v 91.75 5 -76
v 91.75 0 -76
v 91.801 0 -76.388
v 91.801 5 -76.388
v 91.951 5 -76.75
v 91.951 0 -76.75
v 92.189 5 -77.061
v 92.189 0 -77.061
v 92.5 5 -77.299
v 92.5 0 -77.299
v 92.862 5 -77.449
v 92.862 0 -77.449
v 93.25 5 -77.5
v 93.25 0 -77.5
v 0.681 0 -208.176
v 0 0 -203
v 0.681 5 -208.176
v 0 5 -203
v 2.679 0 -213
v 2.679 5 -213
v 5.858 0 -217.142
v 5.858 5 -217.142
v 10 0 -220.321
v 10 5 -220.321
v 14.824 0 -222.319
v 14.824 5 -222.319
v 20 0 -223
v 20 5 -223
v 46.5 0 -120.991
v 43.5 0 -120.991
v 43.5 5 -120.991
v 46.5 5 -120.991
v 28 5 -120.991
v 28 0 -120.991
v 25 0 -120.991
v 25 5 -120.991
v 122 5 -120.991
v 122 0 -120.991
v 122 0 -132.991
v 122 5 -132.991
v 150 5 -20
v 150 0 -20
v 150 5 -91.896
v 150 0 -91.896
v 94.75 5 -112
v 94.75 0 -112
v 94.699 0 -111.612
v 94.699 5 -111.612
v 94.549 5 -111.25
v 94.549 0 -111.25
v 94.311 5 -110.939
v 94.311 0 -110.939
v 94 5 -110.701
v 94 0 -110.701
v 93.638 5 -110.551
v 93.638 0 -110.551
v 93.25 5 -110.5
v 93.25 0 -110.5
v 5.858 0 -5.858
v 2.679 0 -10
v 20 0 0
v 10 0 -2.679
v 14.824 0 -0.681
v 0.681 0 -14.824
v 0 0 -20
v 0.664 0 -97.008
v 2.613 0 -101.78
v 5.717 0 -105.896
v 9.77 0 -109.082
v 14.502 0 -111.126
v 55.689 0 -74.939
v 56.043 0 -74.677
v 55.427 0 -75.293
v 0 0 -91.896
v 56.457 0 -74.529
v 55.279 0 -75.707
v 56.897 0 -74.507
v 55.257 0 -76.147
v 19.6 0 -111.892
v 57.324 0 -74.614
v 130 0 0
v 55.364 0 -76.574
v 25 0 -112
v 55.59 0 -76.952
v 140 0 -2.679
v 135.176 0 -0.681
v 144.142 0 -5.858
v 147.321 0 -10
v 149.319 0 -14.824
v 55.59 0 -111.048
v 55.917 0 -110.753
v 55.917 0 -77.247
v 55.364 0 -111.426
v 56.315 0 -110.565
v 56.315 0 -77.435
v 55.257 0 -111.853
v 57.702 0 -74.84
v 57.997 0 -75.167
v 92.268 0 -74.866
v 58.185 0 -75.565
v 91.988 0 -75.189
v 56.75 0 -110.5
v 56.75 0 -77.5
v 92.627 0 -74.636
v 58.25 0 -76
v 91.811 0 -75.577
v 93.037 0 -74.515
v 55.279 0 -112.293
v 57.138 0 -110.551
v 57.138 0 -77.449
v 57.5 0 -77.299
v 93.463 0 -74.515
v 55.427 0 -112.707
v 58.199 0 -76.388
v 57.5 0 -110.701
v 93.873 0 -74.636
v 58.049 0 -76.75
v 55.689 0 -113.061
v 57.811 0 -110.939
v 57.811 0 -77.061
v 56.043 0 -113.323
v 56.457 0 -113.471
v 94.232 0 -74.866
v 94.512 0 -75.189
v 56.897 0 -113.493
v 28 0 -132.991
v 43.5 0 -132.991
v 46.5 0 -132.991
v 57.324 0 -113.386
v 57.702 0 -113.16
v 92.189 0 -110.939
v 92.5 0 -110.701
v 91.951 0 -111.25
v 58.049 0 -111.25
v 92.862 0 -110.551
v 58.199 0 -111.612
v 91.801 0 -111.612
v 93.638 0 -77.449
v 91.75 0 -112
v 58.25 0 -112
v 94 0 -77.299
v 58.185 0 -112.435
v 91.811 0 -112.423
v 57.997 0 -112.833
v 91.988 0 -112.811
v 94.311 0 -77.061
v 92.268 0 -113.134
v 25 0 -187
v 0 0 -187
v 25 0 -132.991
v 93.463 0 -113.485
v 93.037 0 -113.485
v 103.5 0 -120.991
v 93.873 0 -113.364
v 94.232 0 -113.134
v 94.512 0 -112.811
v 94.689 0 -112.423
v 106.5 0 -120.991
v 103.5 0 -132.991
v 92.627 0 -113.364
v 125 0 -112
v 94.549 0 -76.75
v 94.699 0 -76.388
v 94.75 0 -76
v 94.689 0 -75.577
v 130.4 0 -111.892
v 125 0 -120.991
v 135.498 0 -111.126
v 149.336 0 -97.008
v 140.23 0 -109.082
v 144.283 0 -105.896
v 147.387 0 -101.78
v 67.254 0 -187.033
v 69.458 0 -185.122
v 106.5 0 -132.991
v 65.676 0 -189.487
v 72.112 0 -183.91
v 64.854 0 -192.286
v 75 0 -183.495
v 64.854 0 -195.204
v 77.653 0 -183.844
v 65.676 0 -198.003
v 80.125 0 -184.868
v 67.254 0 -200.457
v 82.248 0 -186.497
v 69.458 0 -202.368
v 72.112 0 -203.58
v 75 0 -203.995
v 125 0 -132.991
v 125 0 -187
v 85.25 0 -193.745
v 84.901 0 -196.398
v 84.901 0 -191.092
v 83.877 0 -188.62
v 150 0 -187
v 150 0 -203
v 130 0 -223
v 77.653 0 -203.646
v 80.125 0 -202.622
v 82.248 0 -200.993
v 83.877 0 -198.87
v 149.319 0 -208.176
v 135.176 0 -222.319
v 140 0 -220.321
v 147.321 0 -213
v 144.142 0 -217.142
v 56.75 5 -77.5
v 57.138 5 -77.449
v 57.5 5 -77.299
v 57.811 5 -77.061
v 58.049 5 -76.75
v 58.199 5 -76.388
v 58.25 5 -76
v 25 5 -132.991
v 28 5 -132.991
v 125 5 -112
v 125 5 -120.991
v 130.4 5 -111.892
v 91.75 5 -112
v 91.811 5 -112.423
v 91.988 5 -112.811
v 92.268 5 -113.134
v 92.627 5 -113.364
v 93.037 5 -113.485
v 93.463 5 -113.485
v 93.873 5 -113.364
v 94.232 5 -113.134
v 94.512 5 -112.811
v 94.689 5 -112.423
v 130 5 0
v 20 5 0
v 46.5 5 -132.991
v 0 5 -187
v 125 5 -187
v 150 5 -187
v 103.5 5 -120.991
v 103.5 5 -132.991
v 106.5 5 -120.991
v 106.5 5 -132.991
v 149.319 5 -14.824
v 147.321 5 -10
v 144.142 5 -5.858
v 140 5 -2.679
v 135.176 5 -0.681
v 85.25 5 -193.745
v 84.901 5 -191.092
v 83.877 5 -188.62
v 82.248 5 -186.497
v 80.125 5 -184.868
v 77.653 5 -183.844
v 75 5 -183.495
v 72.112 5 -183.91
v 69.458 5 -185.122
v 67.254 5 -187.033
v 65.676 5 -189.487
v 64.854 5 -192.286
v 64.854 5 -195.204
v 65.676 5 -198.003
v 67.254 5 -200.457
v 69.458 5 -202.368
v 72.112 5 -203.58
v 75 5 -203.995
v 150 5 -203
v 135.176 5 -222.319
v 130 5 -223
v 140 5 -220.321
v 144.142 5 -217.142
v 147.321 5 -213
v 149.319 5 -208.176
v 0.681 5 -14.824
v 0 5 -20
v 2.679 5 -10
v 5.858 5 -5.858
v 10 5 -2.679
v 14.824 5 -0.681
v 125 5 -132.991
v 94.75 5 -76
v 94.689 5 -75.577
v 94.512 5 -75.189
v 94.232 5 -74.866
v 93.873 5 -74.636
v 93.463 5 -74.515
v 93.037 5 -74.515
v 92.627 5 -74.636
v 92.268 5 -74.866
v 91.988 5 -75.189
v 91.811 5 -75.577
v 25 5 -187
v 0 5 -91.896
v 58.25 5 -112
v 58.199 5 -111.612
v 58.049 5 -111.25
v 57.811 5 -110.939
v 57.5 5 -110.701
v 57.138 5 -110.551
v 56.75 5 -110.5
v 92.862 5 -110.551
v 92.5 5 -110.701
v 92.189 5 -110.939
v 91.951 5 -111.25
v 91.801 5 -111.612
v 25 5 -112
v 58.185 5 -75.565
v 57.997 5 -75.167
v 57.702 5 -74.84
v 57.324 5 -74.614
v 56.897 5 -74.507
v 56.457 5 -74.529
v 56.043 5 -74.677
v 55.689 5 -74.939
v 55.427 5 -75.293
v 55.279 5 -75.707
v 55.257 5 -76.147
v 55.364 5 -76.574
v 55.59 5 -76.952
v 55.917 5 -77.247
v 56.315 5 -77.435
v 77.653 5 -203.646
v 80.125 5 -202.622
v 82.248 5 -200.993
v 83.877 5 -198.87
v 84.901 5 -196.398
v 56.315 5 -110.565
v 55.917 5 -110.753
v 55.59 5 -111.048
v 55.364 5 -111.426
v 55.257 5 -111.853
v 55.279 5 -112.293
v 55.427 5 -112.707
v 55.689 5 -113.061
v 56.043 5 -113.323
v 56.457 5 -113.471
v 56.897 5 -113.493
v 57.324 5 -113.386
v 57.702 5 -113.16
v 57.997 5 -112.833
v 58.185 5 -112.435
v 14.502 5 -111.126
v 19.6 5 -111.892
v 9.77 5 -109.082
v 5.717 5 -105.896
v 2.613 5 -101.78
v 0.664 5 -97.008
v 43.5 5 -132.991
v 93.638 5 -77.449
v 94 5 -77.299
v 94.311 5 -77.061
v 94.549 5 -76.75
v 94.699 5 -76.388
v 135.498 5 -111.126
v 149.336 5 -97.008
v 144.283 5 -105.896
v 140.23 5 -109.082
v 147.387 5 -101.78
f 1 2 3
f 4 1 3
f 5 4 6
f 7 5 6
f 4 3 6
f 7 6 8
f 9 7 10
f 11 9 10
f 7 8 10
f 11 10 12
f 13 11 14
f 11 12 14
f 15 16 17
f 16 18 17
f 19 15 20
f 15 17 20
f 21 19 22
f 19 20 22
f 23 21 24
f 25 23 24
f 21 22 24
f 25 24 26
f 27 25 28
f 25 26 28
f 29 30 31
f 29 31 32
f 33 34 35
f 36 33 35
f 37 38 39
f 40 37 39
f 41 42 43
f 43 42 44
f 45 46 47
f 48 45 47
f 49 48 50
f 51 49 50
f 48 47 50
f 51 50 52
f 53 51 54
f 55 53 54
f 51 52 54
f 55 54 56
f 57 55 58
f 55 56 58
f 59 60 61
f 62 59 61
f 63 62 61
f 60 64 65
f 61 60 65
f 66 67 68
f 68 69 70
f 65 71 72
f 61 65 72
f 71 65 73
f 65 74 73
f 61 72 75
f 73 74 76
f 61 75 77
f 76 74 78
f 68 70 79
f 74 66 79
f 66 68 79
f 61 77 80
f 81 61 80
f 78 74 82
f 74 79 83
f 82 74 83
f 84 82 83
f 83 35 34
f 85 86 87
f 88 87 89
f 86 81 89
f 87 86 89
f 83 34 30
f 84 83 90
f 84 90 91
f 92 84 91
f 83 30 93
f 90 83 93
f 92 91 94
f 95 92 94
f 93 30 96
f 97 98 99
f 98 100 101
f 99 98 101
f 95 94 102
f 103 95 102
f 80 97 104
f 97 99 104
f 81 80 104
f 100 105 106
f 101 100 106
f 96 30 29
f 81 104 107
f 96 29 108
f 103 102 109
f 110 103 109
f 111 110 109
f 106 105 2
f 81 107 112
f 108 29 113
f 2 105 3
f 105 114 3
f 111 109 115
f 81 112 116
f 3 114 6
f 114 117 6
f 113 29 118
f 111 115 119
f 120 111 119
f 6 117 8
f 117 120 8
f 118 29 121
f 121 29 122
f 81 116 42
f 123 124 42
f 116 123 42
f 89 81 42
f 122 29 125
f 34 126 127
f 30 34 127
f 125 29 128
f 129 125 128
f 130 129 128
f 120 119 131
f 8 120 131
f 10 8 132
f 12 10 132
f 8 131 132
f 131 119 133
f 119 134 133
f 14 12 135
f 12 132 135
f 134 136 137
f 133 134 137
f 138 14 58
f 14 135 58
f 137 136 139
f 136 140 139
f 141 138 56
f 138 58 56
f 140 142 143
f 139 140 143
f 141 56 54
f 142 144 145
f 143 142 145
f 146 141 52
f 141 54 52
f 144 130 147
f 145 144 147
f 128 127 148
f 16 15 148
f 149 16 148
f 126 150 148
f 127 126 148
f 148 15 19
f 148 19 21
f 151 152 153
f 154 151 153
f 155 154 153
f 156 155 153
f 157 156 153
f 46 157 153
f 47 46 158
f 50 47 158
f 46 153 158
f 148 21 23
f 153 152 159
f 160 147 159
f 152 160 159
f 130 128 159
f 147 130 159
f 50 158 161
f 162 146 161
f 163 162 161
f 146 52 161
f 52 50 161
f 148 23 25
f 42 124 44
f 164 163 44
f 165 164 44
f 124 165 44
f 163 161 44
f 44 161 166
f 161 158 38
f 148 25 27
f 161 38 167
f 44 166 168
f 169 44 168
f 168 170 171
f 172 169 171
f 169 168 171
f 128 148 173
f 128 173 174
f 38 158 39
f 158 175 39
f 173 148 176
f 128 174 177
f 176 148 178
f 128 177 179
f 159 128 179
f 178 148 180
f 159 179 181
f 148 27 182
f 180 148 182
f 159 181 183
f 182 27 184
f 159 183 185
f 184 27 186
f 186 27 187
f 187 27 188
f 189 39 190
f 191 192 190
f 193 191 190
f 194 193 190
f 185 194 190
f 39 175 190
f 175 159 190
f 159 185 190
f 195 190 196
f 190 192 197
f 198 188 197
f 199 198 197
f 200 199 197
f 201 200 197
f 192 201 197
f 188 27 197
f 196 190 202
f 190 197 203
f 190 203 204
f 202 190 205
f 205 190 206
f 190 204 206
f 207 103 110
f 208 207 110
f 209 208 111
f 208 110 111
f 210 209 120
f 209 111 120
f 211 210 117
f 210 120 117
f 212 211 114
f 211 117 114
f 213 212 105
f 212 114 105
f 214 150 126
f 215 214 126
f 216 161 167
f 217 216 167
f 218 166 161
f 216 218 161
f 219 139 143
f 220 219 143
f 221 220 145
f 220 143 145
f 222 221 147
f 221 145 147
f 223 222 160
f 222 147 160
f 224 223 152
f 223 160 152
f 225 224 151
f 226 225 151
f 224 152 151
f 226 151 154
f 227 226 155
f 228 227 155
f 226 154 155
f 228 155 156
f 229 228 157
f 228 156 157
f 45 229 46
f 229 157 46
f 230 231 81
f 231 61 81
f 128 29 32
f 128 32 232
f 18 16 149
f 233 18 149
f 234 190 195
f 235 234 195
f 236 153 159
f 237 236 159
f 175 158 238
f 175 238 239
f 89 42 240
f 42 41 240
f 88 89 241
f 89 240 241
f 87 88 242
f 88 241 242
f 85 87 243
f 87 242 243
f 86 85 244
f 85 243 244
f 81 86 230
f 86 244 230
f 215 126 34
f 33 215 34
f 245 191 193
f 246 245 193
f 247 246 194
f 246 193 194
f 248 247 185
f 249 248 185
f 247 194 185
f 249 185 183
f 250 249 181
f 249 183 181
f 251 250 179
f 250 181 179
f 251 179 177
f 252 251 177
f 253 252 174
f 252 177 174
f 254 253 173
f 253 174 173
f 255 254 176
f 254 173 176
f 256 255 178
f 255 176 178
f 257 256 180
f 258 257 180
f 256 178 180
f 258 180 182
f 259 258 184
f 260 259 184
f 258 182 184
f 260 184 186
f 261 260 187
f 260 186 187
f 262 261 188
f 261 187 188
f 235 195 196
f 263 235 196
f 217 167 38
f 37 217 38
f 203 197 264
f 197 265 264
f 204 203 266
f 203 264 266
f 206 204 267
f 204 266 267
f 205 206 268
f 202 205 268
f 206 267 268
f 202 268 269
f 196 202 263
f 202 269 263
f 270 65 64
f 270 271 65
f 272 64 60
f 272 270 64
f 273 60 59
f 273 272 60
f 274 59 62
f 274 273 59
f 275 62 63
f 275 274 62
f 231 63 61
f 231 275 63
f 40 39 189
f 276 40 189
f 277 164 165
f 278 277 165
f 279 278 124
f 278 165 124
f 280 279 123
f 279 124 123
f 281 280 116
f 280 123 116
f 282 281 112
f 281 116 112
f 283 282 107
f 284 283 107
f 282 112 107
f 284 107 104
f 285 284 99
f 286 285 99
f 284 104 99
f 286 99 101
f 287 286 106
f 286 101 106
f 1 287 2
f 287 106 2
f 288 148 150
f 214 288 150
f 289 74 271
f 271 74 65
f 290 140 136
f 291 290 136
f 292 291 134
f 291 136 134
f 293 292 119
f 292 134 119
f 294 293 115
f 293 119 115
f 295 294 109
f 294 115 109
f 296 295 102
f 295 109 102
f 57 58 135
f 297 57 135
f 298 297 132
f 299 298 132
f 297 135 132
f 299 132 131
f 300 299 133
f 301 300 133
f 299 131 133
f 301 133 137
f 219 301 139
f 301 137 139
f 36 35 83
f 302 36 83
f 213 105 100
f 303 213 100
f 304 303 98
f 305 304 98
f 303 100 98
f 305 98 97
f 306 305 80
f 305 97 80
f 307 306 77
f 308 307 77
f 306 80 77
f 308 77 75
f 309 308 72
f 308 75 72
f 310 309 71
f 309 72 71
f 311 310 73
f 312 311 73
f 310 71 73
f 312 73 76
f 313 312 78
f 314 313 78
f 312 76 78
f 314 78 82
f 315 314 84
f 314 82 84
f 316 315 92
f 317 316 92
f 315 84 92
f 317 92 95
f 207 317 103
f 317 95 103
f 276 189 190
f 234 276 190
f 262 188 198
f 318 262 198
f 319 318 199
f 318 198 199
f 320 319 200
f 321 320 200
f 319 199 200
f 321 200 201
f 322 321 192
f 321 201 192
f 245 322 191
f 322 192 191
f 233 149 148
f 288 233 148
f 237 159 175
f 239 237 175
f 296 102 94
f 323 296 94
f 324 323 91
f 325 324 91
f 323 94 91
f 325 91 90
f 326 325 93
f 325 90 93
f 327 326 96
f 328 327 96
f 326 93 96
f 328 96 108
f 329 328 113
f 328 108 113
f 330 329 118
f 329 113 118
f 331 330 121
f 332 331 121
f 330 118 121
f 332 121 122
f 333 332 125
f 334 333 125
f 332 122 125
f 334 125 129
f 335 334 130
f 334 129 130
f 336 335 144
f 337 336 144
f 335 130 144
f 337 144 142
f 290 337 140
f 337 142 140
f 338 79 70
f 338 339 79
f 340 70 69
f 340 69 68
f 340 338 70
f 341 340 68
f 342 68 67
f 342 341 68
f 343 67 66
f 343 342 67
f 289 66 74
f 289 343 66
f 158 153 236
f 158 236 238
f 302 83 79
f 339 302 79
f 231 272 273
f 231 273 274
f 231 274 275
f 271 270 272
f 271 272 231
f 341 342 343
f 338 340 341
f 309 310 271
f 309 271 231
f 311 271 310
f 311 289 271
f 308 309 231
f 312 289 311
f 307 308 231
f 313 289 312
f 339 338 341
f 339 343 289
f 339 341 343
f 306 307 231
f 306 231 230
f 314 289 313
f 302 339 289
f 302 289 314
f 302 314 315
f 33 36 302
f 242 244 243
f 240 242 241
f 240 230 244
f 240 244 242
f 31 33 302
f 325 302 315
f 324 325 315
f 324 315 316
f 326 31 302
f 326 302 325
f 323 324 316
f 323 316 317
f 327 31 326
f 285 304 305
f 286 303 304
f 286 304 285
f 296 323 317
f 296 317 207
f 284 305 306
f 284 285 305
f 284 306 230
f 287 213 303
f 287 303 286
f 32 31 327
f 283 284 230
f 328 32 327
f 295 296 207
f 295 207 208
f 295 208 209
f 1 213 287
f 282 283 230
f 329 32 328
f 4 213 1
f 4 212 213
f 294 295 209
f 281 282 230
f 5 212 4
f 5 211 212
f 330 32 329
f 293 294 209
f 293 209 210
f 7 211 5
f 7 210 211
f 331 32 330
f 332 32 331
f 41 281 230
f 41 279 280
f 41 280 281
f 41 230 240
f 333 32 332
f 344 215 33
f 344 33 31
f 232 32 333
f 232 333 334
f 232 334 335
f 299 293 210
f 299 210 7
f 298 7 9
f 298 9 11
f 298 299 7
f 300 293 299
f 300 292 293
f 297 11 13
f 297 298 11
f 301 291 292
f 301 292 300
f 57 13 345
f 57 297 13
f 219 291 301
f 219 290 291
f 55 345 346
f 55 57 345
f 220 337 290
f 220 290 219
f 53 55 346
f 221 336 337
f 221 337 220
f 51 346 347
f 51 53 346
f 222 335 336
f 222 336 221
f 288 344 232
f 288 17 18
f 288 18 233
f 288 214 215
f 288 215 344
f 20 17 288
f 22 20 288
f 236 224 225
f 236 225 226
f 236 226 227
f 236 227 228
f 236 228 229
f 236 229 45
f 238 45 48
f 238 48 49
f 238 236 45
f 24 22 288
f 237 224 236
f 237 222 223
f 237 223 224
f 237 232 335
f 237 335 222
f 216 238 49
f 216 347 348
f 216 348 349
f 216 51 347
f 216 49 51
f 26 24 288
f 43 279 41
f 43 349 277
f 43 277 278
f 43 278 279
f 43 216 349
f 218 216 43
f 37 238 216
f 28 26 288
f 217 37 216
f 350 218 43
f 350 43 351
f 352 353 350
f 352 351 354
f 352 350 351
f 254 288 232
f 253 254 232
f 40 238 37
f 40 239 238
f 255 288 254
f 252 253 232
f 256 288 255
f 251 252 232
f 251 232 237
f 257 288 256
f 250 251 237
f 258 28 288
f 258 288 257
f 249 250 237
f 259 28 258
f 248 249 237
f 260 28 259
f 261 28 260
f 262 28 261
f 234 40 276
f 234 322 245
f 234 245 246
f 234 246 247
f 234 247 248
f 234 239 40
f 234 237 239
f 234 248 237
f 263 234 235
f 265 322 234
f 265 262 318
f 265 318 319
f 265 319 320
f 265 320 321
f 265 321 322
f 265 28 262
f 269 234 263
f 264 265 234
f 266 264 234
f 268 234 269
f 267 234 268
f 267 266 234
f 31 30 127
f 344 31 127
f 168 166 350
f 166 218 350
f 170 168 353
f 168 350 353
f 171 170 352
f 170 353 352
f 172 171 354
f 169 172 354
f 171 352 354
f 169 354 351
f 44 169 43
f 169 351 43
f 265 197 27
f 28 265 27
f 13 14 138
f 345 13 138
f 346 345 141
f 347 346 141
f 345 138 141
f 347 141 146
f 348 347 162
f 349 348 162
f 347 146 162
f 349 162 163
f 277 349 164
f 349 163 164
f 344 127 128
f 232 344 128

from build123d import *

# Parameters (mm, degrees)
SKETCH1_W           = 3
SKETCH1_H           = 12
BOSS_EXTRUDE1_DEPTH = 5
FILLET3_R           = 20
FILLET4_R           = 20
FILLET5_R           = 20


with BuildPart() as part:
    # Sketch1 → Boss-Extrude1 (new body)
    # profile 1 of 4: a face of its own
    with BuildSketch(Plane(origin=(0, 0, 0), x_dir=(1, 0, 0), z_dir=(0, 1, 0))):
        with BuildLine():
            Line((0, 0), (75, 0))
            Line((75, 0), (75, 76))
            Line((75, 76), (58.25, 76))
            ThreePointArc((58.25, 76), (55.689339828, 74.939339828), (56.75, 77.5))
            Line((56.75, 77.5), (56.75, 110.5))
            ThreePointArc((56.75, 110.5), (55.689339828, 113.060660172), (58.25, 112))
            Line((58.25, 112), (75, 112))
            Line((75, 112), (75, 183.494931242))
            ThreePointArc((75, 183.494931242), (64.75, 193.744931242), (75, 203.994931242))
            Line((75, 203.994931242), (75, 223))
            Line((75, 223), (25, 223))
            Line((25, 223), (0, 223))
            Line((0, 223), (0, 187))
            Line((0, 187), (25, 187))
            Line((25, 187), (25, 132.991356344))
            Line((25, 132.991356344), (28, 132.991356344))
            Line((28, 132.991356344), (28, 120.991356344))
            Line((28, 120.991356344), (25, 120.991356344))
            Line((25, 120.991356344), (25, 112))
            Line((25, 112), (0, 111.5))
            Line((0, 111.5), (0, 0))
        make_face()
        with Locations((45, 126.991356344)):
            Rectangle(SKETCH1_W, SKETCH1_H, mode=Mode.SUBTRACT)
    # profile 2 of 4: a face of its own
    with BuildSketch(Plane(origin=(0, 0, 0), x_dir=(1, 0, 0), z_dir=(0, 1, 0))):
        with BuildLine():
            Line((75, 76), (75, 0))
            Line((75, 0), (150, 0))
            Line((150, 0), (150, 111.5))
            Line((150, 111.5), (125, 112))
            Line((125, 112), (125, 120.991356344))
            Line((125, 120.991356344), (122, 120.991356344))
            Line((122, 120.991356344), (122, 132.991356344))
            Line((122, 132.991356344), (125, 132.991356344))
            Line((125, 132.991356344), (125, 187))
            Line((125, 187), (150, 187))
            Line((150, 187), (150, 223))
            Line((150, 223), (75, 223))
            Line((75, 223), (75, 203.994931242))
            ThreePointArc((75, 203.994931242), (82.247844507, 200.992775749), (85.25, 193.744931242))
            ThreePointArc((85.25, 193.744931242), (82.247844507, 186.497086735), (75, 183.494931242))
            Line((75, 183.494931242), (75, 112))
            Line((75, 112), (91.75, 112))
            ThreePointArc((91.75, 112), (93.25, 113.5), (94.75, 112))
            ThreePointArc((94.75, 112), (94.310660172, 110.939339828), (93.25, 110.5))
            Line((93.25, 110.5), (93.25, 77.5))
            ThreePointArc((93.25, 77.5), (94.310660172, 77.060660172), (94.75, 76))
            ThreePointArc((94.75, 76), (93.25, 74.5), (91.75, 76))
            Line((91.75, 76), (75, 76))
        make_face()
        with Locations((105, 126.991356344)):
            Rectangle(SKETCH1_W, SKETCH1_H, mode=Mode.SUBTRACT)
    # profile 3 of 4: a face of its own
    with BuildSketch(Plane(origin=(0, 0, 0), x_dir=(1, 0, 0), z_dir=(0, 1, 0))):
        with BuildLine():
            Line((75, 112), (75, 76))
            Line((75, 76), (91.75, 76))
            ThreePointArc((91.75, 76), (92.189339828, 77.060660172), (93.25, 77.5))
            Line((93.25, 77.5), (93.25, 110.5))
            ThreePointArc((93.25, 110.5), (92.189339828, 110.939339828), (91.75, 112))
            Line((91.75, 112), (75, 112))
        make_face()
    # profile 4 of 4: a face of its own
    with BuildSketch(Plane(origin=(0, 0, 0), x_dir=(1, 0, 0), z_dir=(0, 1, 0))):
        with BuildLine():
            Line((58.25, 76), (75, 76))
            Line((75, 76), (75, 112))
            Line((75, 112), (58.25, 112))
            ThreePointArc((58.25, 112), (57.810660172, 110.939339828), (56.75, 110.5))
            Line((56.75, 110.5), (56.75, 77.5))
            ThreePointArc((56.75, 77.5), (57.810660172, 77.060660172), (58.25, 76))
        make_face()
    extrude(amount=BOSS_EXTRUDE1_DEPTH)

    # Fillet3
    fillet3_edges = [part.edges().sort_by_distance(p)[0] for p in [
        (0, 2.5, -223),
    ]]
    fillet(fillet3_edges, radius=FILLET3_R)

    # Fillet4
    fillet4_edges = [part.edges().sort_by_distance(p)[0] for p in [
        (150, 2.5, -223),
    ]]
    fillet(fillet4_edges, radius=FILLET4_R)

    # Fillet5
    fillet5_edges = [part.edges().sort_by_distance(p)[0] for p in [
        (150, 2.5, -111.5),
        (150, 2.5, 0),
        (0, 2.5, 0),
        (0, 2.5, -111.5),
    ]]
    fillet(fillet5_edges, radius=FILLET5_R)


solid = part.part
